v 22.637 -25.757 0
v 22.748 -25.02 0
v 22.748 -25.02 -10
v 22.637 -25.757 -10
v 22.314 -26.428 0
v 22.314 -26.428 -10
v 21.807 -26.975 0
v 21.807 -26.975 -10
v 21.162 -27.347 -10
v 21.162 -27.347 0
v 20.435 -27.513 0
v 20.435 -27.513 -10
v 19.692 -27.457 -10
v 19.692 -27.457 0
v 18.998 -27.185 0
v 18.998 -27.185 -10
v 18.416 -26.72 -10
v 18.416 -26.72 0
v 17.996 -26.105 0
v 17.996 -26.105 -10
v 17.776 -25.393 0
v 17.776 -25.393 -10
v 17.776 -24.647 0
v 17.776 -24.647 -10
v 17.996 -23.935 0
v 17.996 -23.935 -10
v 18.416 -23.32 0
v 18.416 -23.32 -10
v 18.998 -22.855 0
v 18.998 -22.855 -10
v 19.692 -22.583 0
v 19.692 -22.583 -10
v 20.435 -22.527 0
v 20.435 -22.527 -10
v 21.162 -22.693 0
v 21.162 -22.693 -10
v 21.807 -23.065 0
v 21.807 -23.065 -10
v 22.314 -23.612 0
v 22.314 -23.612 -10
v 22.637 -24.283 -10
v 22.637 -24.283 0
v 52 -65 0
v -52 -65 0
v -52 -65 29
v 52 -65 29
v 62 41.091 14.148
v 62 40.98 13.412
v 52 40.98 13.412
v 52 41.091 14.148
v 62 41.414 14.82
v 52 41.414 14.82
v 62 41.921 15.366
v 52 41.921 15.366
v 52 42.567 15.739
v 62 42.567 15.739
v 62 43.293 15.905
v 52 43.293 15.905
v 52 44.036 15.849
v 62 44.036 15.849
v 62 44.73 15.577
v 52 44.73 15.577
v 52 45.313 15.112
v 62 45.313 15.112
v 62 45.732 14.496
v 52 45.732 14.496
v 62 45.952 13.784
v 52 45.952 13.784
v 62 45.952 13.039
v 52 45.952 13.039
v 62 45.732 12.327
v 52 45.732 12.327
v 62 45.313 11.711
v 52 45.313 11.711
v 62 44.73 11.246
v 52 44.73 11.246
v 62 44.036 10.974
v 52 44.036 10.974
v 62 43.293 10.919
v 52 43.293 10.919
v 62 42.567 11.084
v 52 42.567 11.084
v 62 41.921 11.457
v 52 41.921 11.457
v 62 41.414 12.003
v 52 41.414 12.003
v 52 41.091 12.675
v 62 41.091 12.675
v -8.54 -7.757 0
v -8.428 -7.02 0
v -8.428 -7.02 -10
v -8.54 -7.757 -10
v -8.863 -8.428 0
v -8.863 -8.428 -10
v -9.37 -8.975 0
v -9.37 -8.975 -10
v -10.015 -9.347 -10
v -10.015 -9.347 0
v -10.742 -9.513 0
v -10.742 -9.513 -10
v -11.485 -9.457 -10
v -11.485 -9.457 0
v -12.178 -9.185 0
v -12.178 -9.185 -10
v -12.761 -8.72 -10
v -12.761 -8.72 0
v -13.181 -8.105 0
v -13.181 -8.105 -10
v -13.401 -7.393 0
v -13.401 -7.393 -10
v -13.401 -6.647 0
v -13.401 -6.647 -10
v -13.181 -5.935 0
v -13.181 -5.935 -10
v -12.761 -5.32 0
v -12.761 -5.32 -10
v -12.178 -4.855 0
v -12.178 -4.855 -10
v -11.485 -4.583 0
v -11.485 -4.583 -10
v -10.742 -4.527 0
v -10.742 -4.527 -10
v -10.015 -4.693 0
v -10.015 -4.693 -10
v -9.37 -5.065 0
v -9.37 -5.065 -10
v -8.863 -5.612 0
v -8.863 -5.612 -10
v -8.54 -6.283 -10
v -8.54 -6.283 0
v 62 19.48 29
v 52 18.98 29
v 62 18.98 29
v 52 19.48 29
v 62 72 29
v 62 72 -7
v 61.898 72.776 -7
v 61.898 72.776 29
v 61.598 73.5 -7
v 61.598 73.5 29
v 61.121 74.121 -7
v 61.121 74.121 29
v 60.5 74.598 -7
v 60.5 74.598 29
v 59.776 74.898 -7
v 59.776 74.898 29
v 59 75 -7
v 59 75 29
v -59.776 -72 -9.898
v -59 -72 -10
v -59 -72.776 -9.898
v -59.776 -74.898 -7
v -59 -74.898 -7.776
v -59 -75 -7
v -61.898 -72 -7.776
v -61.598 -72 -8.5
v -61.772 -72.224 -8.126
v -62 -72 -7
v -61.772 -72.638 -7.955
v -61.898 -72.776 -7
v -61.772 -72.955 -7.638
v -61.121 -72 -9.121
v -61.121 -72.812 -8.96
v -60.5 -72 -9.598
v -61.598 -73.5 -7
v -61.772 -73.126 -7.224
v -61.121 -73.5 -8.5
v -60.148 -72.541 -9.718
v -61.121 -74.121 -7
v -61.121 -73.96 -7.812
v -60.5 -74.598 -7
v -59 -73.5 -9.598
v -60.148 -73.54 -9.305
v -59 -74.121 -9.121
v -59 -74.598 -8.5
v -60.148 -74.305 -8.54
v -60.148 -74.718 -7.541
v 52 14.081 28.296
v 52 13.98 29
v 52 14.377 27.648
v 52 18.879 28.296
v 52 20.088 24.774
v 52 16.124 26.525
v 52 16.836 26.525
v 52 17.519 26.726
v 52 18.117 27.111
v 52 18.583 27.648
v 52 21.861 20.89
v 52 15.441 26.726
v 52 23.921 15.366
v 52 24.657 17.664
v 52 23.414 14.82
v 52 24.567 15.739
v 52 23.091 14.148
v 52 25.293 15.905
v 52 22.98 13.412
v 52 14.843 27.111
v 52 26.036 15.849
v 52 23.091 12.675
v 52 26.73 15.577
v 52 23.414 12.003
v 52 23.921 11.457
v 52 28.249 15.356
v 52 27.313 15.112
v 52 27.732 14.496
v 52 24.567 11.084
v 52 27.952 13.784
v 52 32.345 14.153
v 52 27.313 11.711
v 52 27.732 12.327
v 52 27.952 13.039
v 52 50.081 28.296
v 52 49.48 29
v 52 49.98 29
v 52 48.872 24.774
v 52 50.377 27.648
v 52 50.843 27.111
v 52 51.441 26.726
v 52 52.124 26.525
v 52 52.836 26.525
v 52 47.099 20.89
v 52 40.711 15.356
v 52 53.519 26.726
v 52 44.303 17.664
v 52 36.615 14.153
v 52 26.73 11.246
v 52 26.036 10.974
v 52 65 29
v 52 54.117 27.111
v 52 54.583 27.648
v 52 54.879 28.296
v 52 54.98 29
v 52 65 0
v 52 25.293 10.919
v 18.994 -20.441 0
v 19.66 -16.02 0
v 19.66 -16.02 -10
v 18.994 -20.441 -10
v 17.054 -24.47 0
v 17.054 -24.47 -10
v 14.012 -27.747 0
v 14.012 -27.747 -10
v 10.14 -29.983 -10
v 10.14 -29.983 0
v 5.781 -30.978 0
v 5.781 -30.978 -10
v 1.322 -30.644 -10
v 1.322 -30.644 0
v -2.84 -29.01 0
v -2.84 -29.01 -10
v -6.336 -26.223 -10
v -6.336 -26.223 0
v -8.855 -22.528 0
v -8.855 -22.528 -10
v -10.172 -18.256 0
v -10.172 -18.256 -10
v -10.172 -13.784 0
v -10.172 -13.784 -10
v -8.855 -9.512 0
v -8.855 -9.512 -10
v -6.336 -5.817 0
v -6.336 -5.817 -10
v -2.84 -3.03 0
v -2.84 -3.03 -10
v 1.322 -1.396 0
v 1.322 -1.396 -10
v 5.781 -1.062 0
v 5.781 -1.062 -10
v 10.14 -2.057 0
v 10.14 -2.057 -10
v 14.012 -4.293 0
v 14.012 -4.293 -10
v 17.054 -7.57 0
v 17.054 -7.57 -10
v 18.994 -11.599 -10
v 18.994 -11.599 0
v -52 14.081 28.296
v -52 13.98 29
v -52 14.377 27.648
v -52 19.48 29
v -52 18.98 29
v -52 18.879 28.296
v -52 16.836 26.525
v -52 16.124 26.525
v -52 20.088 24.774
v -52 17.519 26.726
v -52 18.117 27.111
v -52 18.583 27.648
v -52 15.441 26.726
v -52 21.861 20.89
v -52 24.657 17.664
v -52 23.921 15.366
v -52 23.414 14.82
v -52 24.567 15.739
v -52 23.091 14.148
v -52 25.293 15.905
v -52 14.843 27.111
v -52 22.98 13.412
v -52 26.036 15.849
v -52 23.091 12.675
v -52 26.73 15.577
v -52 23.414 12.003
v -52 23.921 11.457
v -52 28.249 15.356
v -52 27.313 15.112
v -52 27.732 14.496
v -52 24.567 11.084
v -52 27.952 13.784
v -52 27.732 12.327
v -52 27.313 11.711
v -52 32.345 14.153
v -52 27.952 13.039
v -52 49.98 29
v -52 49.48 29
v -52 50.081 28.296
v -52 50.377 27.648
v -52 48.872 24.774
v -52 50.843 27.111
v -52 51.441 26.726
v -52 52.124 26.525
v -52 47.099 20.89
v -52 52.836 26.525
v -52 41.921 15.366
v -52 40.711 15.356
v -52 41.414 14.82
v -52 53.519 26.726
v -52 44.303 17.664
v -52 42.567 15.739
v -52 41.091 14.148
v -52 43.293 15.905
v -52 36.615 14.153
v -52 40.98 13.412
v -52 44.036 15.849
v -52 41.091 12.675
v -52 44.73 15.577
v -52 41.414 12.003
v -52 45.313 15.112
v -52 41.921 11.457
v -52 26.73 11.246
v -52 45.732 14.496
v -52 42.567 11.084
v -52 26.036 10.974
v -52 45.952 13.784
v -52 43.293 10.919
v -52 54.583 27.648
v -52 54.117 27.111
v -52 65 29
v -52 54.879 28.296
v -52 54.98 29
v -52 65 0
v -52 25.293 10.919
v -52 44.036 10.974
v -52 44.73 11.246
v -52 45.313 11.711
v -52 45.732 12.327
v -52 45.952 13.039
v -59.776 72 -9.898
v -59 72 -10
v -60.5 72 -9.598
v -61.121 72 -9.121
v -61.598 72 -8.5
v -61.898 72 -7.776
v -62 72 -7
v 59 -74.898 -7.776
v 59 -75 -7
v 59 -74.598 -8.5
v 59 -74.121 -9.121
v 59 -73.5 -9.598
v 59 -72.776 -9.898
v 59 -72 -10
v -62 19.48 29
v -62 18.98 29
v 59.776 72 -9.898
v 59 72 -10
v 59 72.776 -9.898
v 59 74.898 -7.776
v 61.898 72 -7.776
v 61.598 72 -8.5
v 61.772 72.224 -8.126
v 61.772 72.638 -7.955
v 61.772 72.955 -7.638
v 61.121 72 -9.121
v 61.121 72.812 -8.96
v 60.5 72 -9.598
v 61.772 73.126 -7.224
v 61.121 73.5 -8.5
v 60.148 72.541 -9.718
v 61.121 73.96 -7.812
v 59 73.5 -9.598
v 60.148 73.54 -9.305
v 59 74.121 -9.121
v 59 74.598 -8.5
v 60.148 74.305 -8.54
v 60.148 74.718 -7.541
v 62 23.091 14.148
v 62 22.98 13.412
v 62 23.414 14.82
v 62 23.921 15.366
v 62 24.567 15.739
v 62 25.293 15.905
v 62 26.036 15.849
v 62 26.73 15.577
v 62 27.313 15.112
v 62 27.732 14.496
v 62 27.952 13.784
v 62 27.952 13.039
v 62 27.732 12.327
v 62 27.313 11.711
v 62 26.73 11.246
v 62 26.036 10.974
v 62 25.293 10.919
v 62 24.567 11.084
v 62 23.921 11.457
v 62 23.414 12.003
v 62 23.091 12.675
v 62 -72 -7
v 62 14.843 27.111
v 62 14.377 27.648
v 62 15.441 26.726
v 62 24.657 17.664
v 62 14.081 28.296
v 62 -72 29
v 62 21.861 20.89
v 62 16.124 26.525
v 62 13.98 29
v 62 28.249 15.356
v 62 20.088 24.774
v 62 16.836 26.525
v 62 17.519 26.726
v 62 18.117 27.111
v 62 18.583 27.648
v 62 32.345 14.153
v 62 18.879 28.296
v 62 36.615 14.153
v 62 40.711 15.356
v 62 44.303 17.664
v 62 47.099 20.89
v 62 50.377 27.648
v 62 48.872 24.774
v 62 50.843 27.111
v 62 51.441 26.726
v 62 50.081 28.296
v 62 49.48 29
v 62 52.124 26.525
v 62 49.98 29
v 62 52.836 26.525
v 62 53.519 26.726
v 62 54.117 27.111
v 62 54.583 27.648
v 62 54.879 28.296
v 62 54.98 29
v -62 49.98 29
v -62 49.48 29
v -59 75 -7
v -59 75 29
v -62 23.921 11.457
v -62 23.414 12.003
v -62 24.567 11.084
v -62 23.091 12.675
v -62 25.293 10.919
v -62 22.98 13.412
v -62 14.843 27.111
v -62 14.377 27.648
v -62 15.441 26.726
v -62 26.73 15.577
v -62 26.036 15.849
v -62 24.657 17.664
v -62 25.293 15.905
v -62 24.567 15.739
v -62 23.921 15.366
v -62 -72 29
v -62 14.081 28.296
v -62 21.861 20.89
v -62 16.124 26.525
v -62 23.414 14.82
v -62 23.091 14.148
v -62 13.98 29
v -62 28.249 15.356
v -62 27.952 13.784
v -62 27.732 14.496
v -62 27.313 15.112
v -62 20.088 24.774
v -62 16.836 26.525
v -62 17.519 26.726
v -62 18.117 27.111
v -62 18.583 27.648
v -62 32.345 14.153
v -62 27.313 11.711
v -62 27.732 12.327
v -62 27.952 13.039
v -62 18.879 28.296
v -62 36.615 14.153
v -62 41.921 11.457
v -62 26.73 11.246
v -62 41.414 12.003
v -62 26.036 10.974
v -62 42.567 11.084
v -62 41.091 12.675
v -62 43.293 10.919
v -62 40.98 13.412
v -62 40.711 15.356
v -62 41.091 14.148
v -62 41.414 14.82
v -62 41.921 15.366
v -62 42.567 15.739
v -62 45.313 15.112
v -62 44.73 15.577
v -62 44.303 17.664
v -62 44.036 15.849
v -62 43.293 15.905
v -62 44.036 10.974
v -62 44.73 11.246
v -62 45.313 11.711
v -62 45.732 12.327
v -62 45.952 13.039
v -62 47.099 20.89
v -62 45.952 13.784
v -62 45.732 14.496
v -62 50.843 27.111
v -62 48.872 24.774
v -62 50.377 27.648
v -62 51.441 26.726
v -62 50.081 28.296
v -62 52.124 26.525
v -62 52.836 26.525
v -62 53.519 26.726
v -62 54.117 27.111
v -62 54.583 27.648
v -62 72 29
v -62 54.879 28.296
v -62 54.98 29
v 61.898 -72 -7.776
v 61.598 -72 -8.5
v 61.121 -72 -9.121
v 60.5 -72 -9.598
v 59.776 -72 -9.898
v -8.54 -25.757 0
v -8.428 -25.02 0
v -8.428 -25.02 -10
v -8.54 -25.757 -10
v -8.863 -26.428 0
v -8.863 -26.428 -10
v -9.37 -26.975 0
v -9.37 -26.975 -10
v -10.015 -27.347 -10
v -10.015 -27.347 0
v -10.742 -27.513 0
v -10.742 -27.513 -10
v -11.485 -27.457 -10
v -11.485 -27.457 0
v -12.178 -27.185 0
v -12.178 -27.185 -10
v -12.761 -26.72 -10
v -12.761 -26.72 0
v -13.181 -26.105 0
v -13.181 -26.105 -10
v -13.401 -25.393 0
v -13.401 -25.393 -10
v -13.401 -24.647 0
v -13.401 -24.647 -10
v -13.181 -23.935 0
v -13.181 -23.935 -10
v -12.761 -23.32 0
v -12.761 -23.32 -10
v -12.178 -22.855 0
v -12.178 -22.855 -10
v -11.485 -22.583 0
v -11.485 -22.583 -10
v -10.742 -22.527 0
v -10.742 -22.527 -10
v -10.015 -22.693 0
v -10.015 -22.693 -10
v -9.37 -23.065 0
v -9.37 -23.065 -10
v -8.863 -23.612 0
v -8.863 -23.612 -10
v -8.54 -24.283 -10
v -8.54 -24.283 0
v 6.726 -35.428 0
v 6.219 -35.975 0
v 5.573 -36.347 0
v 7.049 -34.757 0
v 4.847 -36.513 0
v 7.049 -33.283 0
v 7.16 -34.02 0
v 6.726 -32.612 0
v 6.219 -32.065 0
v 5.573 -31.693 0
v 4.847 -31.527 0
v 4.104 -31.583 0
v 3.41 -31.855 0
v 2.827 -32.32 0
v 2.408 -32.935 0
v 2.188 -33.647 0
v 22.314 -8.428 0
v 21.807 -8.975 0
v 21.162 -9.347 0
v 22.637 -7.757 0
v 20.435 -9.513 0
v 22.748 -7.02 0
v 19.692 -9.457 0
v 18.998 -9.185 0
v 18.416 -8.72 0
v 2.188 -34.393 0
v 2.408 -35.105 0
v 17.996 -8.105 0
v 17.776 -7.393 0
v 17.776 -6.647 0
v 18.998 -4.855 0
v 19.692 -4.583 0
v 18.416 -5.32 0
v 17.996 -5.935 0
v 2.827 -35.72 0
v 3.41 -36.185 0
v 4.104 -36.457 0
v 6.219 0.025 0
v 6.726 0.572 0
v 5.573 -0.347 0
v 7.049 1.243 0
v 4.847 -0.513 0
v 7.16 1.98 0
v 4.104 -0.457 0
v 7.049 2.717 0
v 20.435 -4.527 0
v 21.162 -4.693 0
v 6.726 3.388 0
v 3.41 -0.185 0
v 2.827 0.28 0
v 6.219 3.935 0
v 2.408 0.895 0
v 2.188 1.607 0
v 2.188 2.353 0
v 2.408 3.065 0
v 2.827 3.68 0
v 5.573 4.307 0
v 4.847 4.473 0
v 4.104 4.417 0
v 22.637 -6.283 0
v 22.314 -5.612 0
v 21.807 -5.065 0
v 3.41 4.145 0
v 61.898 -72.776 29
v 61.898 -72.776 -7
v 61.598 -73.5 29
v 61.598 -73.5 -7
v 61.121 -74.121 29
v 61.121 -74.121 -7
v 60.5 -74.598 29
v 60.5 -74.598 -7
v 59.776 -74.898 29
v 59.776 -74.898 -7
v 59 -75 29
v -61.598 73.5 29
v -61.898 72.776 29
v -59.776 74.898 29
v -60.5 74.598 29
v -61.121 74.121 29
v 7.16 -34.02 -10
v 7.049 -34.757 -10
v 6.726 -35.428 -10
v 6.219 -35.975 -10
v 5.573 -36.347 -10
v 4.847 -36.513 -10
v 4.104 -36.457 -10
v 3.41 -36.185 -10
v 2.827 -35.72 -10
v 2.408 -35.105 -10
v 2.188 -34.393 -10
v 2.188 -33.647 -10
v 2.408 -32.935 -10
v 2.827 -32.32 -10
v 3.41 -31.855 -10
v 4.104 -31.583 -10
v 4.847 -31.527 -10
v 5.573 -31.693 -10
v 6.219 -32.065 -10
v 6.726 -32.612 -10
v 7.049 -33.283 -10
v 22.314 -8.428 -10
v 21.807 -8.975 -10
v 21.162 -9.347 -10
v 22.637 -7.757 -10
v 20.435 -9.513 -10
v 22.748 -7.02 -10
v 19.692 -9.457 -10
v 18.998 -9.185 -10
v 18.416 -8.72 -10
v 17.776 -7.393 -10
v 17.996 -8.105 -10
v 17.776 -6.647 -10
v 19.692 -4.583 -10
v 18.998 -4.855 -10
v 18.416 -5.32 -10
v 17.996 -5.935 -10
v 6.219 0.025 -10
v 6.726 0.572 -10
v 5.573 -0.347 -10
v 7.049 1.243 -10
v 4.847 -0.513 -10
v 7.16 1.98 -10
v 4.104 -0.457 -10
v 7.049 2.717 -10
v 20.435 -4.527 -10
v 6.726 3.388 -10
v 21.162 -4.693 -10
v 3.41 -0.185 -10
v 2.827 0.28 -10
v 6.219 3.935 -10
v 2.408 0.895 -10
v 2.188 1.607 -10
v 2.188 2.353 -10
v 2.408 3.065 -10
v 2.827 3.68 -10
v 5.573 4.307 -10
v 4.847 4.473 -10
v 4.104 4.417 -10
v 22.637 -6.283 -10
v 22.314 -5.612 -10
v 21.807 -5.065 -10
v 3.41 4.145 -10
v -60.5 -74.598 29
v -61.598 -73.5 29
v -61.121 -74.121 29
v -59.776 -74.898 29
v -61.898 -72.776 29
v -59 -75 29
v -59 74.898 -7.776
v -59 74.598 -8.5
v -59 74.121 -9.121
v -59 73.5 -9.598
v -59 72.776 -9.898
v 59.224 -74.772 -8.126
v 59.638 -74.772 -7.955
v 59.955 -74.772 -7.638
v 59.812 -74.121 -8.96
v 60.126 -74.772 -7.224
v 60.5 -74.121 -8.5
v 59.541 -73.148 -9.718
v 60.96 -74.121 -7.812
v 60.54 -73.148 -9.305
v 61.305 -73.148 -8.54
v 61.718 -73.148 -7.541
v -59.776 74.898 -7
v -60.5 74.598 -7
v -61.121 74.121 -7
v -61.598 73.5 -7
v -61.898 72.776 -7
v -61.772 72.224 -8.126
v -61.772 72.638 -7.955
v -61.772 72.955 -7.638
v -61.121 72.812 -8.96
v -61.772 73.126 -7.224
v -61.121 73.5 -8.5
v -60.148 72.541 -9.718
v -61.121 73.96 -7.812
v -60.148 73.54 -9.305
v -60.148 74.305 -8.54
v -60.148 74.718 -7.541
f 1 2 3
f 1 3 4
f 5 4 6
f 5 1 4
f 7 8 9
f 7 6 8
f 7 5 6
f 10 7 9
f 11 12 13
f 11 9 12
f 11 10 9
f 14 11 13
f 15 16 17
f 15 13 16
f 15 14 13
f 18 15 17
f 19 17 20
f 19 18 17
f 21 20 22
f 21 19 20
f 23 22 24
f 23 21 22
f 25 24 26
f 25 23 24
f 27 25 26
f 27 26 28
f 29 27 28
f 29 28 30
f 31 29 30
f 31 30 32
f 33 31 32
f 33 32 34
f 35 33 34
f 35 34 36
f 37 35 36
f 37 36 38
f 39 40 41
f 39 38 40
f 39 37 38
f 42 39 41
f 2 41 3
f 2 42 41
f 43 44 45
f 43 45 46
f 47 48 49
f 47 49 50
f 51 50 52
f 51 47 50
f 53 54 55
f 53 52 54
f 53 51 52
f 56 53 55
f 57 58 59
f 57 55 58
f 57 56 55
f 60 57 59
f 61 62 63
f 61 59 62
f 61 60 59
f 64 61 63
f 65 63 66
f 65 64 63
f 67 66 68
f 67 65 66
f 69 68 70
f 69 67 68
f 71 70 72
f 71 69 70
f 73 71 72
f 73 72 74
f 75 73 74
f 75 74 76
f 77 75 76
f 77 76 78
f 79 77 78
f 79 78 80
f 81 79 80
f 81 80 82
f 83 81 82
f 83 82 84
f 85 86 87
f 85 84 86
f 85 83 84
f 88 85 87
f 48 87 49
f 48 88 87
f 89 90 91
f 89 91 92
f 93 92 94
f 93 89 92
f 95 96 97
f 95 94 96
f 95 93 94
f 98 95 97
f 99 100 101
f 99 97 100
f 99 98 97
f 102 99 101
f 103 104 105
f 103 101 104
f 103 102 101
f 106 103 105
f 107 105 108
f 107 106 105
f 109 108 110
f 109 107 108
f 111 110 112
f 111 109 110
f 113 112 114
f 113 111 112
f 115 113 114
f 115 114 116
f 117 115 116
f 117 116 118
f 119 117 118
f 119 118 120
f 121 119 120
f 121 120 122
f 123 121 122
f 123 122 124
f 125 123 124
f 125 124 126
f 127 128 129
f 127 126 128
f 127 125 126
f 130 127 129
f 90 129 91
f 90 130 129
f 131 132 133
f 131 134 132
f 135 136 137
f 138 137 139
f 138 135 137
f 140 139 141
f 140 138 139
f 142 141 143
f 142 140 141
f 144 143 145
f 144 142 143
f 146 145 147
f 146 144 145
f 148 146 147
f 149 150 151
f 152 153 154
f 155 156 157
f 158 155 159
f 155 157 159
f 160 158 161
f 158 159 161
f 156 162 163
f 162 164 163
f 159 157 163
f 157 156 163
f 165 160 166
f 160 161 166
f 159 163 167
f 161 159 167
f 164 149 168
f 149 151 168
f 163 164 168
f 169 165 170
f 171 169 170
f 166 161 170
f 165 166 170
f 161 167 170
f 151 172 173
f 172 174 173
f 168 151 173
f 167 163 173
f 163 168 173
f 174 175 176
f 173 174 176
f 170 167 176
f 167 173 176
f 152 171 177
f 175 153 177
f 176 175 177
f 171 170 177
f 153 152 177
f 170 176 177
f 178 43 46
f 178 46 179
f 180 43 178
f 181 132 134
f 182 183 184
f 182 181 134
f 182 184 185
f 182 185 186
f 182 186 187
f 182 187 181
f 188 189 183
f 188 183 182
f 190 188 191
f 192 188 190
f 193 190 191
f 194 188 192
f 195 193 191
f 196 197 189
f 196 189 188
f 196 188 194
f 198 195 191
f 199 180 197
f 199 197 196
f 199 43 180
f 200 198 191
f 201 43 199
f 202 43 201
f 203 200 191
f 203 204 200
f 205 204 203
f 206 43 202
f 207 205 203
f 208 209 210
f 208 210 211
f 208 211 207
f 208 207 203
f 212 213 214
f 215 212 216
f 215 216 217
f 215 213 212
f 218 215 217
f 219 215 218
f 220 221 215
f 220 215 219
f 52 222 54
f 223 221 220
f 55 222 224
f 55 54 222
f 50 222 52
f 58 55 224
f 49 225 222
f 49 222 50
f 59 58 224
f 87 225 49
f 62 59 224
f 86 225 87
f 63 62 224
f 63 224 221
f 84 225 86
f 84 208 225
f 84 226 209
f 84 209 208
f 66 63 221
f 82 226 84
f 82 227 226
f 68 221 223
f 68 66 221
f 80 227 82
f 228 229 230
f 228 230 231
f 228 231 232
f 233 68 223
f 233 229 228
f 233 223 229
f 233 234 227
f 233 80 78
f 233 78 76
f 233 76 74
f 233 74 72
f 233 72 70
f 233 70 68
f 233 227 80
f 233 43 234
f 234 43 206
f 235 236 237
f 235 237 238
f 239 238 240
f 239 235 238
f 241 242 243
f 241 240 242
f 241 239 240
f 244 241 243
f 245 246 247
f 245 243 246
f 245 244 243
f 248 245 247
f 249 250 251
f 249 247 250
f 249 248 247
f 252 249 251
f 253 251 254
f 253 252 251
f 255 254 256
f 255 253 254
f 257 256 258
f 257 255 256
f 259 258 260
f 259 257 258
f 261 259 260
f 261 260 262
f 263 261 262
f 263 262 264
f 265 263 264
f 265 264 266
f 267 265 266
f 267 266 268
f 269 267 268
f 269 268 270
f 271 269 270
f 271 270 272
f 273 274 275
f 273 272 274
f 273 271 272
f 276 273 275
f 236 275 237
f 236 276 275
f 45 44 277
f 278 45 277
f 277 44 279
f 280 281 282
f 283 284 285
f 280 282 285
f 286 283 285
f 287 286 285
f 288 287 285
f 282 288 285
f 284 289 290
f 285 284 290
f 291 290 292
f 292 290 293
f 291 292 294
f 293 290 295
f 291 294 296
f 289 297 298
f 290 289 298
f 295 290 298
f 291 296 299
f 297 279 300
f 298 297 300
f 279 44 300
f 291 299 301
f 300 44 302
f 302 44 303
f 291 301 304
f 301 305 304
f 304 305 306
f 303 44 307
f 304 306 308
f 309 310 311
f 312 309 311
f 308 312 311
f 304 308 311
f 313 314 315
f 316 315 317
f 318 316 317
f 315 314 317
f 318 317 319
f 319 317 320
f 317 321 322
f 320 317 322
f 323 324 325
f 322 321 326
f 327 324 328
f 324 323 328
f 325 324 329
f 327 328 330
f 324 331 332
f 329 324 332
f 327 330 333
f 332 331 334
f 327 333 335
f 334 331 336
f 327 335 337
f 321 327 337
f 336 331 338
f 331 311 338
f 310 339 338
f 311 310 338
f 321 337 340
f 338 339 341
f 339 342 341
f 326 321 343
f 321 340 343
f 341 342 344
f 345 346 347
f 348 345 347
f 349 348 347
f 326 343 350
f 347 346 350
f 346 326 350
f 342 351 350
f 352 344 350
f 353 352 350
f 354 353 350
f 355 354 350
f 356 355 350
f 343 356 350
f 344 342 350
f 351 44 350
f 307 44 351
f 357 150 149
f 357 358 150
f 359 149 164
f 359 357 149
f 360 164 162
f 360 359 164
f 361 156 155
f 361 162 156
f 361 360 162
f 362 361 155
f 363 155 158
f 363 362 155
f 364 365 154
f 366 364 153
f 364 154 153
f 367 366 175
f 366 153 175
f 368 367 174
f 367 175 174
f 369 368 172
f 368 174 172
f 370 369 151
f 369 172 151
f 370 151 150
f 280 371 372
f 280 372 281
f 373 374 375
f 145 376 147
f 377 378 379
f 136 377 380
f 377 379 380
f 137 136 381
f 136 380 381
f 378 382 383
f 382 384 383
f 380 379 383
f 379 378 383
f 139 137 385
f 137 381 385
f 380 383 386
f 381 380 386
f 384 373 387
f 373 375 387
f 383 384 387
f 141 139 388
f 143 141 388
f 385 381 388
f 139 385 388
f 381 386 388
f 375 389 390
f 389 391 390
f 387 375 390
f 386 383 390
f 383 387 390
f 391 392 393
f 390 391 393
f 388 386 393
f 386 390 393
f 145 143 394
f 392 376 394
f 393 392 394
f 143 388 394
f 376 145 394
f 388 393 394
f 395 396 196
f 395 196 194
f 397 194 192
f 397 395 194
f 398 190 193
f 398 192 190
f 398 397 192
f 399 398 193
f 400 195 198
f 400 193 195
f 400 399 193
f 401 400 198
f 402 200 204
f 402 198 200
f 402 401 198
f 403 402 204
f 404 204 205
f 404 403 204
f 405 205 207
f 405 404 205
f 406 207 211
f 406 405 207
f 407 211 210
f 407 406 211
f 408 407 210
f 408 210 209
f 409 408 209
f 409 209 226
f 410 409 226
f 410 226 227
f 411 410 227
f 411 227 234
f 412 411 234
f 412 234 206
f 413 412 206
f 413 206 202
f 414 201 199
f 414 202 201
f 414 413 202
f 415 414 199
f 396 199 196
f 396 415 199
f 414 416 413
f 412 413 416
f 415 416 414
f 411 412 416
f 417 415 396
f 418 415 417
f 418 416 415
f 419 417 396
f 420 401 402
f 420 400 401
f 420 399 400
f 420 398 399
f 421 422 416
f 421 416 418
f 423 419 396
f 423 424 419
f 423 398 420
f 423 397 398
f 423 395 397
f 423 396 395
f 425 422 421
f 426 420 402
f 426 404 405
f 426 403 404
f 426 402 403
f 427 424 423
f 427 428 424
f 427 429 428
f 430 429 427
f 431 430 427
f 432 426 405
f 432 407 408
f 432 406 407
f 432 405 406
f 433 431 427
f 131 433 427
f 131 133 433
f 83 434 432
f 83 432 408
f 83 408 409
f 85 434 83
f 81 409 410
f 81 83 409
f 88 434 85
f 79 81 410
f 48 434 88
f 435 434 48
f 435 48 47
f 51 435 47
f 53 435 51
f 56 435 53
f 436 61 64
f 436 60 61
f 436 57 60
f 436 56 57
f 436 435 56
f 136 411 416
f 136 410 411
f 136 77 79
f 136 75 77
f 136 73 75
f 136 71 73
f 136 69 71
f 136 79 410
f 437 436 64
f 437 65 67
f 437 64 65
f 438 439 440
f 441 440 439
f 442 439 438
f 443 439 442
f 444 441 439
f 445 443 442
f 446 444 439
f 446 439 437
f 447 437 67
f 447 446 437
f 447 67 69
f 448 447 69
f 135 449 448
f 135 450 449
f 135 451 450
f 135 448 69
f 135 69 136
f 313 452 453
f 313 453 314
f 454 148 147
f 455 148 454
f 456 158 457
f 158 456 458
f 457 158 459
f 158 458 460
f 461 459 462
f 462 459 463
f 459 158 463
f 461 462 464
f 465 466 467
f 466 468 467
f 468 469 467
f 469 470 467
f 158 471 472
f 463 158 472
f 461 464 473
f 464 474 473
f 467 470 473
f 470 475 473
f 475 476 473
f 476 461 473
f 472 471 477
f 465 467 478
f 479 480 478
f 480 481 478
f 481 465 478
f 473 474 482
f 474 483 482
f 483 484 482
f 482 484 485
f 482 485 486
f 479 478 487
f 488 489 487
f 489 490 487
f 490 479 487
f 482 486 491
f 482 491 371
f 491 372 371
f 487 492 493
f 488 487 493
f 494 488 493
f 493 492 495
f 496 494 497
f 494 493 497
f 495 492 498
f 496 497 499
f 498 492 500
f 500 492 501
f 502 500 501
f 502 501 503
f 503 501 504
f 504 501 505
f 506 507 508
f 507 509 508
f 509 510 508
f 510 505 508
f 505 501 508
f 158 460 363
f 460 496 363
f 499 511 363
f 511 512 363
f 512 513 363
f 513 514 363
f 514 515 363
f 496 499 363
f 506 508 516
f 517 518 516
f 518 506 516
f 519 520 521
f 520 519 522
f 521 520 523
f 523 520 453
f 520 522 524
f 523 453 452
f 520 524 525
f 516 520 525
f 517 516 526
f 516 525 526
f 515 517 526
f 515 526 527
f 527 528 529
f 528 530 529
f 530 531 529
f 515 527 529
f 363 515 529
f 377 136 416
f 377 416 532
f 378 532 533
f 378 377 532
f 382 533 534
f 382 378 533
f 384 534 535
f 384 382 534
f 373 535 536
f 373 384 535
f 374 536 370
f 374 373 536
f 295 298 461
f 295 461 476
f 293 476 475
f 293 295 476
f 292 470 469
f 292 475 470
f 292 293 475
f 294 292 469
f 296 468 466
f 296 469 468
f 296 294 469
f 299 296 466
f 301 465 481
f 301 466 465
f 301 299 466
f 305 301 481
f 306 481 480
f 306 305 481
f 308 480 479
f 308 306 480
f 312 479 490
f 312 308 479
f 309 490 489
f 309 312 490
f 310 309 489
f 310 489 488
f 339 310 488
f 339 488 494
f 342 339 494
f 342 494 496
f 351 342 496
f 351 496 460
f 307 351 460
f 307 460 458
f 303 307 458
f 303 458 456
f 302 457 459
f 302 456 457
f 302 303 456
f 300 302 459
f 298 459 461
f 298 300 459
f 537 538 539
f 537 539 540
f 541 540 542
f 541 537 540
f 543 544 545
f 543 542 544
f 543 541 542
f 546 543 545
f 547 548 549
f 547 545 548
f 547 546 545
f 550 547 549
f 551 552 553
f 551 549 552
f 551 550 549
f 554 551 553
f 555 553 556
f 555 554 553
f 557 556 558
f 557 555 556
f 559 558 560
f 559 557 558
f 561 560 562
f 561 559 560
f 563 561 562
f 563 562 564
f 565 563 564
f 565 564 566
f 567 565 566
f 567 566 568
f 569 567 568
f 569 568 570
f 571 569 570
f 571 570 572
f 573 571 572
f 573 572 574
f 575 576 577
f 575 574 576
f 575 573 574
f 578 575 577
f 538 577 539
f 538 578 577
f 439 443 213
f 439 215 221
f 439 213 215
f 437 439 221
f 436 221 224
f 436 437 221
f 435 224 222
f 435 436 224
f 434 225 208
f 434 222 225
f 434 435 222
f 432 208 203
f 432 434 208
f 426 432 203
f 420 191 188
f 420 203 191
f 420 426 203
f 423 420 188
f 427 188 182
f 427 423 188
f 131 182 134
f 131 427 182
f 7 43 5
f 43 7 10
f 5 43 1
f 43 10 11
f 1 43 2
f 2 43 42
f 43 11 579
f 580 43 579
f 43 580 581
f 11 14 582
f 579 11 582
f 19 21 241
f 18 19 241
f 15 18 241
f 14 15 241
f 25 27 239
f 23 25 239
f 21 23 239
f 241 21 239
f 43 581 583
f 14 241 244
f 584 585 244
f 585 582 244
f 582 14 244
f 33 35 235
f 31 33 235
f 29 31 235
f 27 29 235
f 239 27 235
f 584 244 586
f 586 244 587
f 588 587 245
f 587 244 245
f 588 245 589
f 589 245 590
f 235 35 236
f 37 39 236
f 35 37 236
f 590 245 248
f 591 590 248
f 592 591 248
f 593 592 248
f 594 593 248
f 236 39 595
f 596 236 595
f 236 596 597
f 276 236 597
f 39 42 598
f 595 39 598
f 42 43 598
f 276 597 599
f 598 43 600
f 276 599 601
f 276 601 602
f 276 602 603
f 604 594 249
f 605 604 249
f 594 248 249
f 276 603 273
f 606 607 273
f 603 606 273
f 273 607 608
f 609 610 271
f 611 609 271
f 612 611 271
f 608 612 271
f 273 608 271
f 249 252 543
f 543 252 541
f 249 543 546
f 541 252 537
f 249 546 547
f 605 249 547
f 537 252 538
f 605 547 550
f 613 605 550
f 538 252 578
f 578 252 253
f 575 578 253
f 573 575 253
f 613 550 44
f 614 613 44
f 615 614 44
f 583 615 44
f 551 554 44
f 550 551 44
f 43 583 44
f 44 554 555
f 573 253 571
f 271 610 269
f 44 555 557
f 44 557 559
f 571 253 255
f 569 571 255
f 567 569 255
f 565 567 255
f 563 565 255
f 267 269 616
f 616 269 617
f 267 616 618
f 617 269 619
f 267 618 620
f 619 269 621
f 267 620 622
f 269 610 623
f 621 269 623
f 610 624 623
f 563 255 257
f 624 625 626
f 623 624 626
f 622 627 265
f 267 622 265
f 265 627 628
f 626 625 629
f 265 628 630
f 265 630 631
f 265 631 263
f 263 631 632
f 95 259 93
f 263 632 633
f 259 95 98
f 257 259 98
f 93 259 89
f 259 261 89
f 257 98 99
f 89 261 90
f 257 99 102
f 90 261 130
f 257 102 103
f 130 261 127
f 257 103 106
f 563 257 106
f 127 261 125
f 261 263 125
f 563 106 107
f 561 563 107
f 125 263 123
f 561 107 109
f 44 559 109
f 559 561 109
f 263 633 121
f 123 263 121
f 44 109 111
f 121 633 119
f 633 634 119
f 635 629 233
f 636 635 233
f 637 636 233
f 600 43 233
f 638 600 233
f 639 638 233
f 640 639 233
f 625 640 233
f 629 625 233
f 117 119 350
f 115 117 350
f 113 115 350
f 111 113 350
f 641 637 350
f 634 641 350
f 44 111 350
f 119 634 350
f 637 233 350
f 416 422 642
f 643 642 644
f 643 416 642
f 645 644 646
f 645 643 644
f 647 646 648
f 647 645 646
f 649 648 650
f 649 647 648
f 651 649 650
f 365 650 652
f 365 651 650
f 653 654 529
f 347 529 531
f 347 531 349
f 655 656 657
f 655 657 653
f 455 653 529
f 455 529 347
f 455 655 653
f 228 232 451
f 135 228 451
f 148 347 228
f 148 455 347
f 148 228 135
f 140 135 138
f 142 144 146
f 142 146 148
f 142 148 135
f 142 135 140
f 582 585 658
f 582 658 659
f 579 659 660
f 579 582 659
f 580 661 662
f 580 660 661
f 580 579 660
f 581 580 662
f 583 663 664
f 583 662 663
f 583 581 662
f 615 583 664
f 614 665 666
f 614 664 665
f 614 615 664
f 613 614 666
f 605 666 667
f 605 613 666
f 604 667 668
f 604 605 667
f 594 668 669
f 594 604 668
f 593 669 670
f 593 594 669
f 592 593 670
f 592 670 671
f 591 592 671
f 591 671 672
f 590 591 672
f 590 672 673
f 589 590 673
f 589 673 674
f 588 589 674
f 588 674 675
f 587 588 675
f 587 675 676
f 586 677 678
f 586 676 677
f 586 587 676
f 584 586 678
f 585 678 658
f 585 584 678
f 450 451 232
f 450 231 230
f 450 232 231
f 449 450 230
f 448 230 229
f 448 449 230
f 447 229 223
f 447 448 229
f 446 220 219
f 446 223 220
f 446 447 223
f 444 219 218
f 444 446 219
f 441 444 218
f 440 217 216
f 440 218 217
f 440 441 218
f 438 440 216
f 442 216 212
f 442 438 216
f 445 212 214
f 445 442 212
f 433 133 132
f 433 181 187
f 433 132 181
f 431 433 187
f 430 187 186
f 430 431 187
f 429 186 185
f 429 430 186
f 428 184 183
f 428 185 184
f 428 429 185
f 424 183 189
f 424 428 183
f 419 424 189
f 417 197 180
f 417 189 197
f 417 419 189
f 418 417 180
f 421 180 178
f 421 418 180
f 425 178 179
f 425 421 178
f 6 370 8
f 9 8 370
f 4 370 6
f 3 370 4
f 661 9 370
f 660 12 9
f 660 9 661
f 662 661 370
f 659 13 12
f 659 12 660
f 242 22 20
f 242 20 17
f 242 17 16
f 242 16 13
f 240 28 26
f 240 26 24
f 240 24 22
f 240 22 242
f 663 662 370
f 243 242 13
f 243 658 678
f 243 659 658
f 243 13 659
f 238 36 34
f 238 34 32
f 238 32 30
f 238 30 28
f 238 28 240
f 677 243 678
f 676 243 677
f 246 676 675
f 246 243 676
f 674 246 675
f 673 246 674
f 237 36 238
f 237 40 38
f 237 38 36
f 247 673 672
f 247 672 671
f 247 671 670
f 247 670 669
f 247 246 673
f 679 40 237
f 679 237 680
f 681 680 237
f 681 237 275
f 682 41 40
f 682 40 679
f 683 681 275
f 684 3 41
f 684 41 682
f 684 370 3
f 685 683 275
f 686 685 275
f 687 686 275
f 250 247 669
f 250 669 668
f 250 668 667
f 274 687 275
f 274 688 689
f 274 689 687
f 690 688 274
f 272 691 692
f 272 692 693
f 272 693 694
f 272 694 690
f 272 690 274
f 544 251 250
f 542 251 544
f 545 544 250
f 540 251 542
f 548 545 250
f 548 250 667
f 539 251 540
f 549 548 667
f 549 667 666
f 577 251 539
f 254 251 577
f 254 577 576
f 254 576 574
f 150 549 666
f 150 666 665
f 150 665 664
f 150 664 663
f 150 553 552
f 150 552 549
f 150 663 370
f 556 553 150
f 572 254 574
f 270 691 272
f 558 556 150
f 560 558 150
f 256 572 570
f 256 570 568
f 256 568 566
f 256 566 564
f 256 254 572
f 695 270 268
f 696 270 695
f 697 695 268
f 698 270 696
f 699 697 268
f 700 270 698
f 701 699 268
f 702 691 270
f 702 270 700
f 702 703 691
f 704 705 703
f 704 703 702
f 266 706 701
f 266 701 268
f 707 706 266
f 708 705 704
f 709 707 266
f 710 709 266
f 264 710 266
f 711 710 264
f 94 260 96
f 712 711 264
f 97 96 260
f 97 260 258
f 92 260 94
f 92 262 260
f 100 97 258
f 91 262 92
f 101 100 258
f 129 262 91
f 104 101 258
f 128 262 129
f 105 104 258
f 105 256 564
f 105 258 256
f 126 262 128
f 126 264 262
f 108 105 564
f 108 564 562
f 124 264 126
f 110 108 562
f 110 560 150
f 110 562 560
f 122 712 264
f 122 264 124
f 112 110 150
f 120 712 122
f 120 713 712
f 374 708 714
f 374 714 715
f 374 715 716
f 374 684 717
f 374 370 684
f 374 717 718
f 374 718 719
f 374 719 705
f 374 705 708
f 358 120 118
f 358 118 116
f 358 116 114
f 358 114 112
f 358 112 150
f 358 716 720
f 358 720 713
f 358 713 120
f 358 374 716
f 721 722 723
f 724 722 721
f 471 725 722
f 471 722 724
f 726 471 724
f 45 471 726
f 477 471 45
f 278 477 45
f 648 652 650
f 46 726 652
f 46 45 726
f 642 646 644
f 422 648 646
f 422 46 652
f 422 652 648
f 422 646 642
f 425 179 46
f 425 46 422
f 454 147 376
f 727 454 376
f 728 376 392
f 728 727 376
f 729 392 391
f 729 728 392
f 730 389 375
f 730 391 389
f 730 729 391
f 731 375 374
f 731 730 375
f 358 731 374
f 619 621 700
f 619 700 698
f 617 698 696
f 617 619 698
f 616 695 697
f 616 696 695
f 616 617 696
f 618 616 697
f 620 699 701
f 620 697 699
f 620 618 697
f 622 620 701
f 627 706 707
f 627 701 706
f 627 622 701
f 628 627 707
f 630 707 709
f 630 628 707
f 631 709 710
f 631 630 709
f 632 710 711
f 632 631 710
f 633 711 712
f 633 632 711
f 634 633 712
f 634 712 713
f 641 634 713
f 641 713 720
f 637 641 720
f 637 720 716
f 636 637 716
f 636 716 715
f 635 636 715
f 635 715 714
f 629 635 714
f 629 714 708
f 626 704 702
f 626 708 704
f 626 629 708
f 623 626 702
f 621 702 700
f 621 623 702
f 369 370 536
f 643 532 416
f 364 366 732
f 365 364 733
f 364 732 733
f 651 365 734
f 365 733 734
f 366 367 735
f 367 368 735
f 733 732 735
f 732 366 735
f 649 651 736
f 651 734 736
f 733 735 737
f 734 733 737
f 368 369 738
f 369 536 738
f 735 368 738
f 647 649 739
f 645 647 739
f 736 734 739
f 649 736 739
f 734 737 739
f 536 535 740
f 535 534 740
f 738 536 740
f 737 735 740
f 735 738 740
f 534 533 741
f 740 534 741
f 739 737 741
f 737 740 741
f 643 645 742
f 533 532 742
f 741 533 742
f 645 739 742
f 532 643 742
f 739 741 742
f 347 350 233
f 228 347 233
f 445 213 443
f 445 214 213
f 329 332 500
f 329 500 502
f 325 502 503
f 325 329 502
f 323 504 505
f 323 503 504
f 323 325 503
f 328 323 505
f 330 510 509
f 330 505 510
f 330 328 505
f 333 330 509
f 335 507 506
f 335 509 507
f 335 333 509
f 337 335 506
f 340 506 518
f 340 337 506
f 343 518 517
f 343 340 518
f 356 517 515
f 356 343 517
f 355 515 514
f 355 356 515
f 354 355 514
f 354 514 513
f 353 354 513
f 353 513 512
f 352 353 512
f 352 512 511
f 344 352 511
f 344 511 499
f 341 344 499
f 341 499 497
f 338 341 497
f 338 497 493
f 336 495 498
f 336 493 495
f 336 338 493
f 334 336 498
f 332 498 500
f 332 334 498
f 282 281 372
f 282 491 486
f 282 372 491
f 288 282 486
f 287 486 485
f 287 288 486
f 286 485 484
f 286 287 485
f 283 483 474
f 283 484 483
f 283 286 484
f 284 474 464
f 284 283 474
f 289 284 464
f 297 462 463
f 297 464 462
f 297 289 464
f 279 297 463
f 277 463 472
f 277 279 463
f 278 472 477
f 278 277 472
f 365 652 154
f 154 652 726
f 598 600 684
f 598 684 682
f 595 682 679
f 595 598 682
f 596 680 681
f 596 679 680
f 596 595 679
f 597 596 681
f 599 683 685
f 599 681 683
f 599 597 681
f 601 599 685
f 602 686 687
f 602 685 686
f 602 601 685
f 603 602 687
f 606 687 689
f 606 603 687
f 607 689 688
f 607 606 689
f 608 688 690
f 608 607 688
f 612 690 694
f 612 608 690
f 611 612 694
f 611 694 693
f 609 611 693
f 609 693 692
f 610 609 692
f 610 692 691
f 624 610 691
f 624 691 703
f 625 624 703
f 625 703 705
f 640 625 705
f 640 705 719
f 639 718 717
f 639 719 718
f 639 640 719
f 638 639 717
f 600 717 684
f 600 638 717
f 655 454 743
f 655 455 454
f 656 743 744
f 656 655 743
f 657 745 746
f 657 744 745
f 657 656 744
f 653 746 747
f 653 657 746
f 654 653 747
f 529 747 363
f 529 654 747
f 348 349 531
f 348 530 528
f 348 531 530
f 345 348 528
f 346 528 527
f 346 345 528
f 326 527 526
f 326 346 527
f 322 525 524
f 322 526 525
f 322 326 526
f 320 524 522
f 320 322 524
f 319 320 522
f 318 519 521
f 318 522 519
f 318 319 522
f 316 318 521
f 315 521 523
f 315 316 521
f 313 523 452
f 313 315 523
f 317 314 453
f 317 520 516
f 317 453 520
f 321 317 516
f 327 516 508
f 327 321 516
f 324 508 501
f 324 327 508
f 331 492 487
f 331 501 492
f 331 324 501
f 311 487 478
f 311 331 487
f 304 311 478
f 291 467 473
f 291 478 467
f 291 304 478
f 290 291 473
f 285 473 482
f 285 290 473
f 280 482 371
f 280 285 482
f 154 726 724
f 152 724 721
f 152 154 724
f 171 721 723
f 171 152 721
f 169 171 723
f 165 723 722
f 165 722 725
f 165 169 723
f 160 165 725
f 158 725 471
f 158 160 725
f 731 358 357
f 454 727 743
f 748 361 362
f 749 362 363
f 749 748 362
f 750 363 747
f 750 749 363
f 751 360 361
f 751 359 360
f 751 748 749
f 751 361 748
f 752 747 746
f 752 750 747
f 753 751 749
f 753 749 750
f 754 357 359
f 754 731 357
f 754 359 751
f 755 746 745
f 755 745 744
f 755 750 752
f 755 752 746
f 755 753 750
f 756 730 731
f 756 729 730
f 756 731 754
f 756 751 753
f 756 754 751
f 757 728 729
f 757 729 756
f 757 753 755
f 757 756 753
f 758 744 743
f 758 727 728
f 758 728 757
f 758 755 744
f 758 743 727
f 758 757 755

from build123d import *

# Parameters (mm, degrees)
SKETCH1_W               = 124
SKETCH1_H               = 150
SKETCH1_W_2             = 104
SKETCH1_H_2             = 130
BOSS_EXTRUDE1_DEPTH     = 29
SKETCH2_W               = 124
SKETCH2_H               = 150
BOSS_EXTRUDE2_DEPTH     = 10
CUT_EXTRUDE1_DEPTH      = 105.833200848
CUT_EXTRUDE1_DEPTH_BACK = 105.833200848
SKETCH3_R               = 15
SKETCH3_R_2             = 2.5
CUT_EXTRUDE2_DEPTH      = 148.79039211
CUT_EXTRUDE2_DEPTH_BACK = 148.79039211
SKETCH4_R               = 15
SKETCH4_R_2             = 2.5
FILLET1_R               = 3


with BuildPart() as part:
    # Sketch1 → Boss-Extrude1 (new body)
    with BuildSketch(Plane.XY):
        Rectangle(SKETCH1_W, SKETCH1_H)
        Rectangle(SKETCH1_W_2, SKETCH1_H_2, mode=Mode.SUBTRACT)
    extrude(amount=BOSS_EXTRUDE1_DEPTH)

    # Sketch2 → Boss-Extrude2 (add)
    with BuildSketch(Plane(origin=(0, 0, 0), x_dir=(-1, 0, 0), z_dir=(0, 0, -1))):
        Rectangle(SKETCH2_W, SKETCH2_H)
    extrude(amount=BOSS_EXTRUDE2_DEPTH)

    # Sketch3 → Cut-Extrude1 (cut, two sides: drawn at the far end of the back side and taken through both)
    with BuildSketch(Plane(origin=(0, 0, -10), x_dir=(-1, 0, 0), z_dir=(0, 0, -1)).offset(-CUT_EXTRUDE1_DEPTH_BACK)):
        with Locations(Location((-4.66, -16.02, 0), (0, 0, 180))):
            Circle(SKETCH3_R)
        with Locations(Location((-4.66, 1.98, 0), (0, 0, 180))):
            Circle(SKETCH3_R_2)
        with Locations(Location((10.928457268, -7.02, 0), (0, 0, 180))):
            Circle(SKETCH3_R_2)
        with Locations(Location((10.928457268, -25.02, 0), (0, 0, 180))):
            Circle(SKETCH3_R_2)
        with Locations(Location((-4.66, -34.02, 0), (0, 0, 180))):
            Circle(SKETCH3_R_2)
        with Locations(Location((-20.248457268, -25.02, 0), (0, 0, 180))):
            Circle(SKETCH3_R_2)
        with Locations(Location((-20.248457268, -7.02, 0), (0, 0, 180))):
            Circle(SKETCH3_R_2)
    extrude(amount=CUT_EXTRUDE1_DEPTH + CUT_EXTRUDE1_DEPTH_BACK, mode=Mode.SUBTRACT)

    # Sketch4 → Cut-Extrude2 (cut, two sides: drawn at the far end of the back side and taken through both)
    with BuildSketch(Plane.ZY.offset(62).offset(-CUT_EXTRUDE2_DEPTH_BACK)):
        with Locations((29, 34.48)):
            Circle(SKETCH4_R)
        with Locations((29, 52.48)):
            Circle(SKETCH4_R_2)
        with Locations((44.588457268, 43.48)):
            Circle(SKETCH4_R_2)
        with Locations((44.588457268, 25.48)):
            Circle(SKETCH4_R_2)
        with Locations((29, 16.48)):
            Circle(SKETCH4_R_2)
        with Locations(Location((13.411542732, 25.48, 0), (0, 0, 270))):
            Circle(SKETCH4_R_2)
        with Locations(Location((13.411542732, 43.48, 0), (0, 0, 270))):
            Circle(SKETCH4_R_2)
    extrude(amount=CUT_EXTRUDE2_DEPTH + CUT_EXTRUDE2_DEPTH_BACK, mode=Mode.SUBTRACT)

    # Fillet1
    fillet1_edges = [part.edges().sort_by_distance(p)[0] for p in [
        (0, 75, -10),
        (62, 0, -10),
        (0, -75, -10),
        (-62, 0, -10),
        (62, -75, 9.5),
        (-62, -75, 9.5),
        (-62, 75, 9.5),
        (62, 75, 9.5),
    ]]
    fillet(fillet1_edges, radius=FILLET1_R)


solid = part.part
